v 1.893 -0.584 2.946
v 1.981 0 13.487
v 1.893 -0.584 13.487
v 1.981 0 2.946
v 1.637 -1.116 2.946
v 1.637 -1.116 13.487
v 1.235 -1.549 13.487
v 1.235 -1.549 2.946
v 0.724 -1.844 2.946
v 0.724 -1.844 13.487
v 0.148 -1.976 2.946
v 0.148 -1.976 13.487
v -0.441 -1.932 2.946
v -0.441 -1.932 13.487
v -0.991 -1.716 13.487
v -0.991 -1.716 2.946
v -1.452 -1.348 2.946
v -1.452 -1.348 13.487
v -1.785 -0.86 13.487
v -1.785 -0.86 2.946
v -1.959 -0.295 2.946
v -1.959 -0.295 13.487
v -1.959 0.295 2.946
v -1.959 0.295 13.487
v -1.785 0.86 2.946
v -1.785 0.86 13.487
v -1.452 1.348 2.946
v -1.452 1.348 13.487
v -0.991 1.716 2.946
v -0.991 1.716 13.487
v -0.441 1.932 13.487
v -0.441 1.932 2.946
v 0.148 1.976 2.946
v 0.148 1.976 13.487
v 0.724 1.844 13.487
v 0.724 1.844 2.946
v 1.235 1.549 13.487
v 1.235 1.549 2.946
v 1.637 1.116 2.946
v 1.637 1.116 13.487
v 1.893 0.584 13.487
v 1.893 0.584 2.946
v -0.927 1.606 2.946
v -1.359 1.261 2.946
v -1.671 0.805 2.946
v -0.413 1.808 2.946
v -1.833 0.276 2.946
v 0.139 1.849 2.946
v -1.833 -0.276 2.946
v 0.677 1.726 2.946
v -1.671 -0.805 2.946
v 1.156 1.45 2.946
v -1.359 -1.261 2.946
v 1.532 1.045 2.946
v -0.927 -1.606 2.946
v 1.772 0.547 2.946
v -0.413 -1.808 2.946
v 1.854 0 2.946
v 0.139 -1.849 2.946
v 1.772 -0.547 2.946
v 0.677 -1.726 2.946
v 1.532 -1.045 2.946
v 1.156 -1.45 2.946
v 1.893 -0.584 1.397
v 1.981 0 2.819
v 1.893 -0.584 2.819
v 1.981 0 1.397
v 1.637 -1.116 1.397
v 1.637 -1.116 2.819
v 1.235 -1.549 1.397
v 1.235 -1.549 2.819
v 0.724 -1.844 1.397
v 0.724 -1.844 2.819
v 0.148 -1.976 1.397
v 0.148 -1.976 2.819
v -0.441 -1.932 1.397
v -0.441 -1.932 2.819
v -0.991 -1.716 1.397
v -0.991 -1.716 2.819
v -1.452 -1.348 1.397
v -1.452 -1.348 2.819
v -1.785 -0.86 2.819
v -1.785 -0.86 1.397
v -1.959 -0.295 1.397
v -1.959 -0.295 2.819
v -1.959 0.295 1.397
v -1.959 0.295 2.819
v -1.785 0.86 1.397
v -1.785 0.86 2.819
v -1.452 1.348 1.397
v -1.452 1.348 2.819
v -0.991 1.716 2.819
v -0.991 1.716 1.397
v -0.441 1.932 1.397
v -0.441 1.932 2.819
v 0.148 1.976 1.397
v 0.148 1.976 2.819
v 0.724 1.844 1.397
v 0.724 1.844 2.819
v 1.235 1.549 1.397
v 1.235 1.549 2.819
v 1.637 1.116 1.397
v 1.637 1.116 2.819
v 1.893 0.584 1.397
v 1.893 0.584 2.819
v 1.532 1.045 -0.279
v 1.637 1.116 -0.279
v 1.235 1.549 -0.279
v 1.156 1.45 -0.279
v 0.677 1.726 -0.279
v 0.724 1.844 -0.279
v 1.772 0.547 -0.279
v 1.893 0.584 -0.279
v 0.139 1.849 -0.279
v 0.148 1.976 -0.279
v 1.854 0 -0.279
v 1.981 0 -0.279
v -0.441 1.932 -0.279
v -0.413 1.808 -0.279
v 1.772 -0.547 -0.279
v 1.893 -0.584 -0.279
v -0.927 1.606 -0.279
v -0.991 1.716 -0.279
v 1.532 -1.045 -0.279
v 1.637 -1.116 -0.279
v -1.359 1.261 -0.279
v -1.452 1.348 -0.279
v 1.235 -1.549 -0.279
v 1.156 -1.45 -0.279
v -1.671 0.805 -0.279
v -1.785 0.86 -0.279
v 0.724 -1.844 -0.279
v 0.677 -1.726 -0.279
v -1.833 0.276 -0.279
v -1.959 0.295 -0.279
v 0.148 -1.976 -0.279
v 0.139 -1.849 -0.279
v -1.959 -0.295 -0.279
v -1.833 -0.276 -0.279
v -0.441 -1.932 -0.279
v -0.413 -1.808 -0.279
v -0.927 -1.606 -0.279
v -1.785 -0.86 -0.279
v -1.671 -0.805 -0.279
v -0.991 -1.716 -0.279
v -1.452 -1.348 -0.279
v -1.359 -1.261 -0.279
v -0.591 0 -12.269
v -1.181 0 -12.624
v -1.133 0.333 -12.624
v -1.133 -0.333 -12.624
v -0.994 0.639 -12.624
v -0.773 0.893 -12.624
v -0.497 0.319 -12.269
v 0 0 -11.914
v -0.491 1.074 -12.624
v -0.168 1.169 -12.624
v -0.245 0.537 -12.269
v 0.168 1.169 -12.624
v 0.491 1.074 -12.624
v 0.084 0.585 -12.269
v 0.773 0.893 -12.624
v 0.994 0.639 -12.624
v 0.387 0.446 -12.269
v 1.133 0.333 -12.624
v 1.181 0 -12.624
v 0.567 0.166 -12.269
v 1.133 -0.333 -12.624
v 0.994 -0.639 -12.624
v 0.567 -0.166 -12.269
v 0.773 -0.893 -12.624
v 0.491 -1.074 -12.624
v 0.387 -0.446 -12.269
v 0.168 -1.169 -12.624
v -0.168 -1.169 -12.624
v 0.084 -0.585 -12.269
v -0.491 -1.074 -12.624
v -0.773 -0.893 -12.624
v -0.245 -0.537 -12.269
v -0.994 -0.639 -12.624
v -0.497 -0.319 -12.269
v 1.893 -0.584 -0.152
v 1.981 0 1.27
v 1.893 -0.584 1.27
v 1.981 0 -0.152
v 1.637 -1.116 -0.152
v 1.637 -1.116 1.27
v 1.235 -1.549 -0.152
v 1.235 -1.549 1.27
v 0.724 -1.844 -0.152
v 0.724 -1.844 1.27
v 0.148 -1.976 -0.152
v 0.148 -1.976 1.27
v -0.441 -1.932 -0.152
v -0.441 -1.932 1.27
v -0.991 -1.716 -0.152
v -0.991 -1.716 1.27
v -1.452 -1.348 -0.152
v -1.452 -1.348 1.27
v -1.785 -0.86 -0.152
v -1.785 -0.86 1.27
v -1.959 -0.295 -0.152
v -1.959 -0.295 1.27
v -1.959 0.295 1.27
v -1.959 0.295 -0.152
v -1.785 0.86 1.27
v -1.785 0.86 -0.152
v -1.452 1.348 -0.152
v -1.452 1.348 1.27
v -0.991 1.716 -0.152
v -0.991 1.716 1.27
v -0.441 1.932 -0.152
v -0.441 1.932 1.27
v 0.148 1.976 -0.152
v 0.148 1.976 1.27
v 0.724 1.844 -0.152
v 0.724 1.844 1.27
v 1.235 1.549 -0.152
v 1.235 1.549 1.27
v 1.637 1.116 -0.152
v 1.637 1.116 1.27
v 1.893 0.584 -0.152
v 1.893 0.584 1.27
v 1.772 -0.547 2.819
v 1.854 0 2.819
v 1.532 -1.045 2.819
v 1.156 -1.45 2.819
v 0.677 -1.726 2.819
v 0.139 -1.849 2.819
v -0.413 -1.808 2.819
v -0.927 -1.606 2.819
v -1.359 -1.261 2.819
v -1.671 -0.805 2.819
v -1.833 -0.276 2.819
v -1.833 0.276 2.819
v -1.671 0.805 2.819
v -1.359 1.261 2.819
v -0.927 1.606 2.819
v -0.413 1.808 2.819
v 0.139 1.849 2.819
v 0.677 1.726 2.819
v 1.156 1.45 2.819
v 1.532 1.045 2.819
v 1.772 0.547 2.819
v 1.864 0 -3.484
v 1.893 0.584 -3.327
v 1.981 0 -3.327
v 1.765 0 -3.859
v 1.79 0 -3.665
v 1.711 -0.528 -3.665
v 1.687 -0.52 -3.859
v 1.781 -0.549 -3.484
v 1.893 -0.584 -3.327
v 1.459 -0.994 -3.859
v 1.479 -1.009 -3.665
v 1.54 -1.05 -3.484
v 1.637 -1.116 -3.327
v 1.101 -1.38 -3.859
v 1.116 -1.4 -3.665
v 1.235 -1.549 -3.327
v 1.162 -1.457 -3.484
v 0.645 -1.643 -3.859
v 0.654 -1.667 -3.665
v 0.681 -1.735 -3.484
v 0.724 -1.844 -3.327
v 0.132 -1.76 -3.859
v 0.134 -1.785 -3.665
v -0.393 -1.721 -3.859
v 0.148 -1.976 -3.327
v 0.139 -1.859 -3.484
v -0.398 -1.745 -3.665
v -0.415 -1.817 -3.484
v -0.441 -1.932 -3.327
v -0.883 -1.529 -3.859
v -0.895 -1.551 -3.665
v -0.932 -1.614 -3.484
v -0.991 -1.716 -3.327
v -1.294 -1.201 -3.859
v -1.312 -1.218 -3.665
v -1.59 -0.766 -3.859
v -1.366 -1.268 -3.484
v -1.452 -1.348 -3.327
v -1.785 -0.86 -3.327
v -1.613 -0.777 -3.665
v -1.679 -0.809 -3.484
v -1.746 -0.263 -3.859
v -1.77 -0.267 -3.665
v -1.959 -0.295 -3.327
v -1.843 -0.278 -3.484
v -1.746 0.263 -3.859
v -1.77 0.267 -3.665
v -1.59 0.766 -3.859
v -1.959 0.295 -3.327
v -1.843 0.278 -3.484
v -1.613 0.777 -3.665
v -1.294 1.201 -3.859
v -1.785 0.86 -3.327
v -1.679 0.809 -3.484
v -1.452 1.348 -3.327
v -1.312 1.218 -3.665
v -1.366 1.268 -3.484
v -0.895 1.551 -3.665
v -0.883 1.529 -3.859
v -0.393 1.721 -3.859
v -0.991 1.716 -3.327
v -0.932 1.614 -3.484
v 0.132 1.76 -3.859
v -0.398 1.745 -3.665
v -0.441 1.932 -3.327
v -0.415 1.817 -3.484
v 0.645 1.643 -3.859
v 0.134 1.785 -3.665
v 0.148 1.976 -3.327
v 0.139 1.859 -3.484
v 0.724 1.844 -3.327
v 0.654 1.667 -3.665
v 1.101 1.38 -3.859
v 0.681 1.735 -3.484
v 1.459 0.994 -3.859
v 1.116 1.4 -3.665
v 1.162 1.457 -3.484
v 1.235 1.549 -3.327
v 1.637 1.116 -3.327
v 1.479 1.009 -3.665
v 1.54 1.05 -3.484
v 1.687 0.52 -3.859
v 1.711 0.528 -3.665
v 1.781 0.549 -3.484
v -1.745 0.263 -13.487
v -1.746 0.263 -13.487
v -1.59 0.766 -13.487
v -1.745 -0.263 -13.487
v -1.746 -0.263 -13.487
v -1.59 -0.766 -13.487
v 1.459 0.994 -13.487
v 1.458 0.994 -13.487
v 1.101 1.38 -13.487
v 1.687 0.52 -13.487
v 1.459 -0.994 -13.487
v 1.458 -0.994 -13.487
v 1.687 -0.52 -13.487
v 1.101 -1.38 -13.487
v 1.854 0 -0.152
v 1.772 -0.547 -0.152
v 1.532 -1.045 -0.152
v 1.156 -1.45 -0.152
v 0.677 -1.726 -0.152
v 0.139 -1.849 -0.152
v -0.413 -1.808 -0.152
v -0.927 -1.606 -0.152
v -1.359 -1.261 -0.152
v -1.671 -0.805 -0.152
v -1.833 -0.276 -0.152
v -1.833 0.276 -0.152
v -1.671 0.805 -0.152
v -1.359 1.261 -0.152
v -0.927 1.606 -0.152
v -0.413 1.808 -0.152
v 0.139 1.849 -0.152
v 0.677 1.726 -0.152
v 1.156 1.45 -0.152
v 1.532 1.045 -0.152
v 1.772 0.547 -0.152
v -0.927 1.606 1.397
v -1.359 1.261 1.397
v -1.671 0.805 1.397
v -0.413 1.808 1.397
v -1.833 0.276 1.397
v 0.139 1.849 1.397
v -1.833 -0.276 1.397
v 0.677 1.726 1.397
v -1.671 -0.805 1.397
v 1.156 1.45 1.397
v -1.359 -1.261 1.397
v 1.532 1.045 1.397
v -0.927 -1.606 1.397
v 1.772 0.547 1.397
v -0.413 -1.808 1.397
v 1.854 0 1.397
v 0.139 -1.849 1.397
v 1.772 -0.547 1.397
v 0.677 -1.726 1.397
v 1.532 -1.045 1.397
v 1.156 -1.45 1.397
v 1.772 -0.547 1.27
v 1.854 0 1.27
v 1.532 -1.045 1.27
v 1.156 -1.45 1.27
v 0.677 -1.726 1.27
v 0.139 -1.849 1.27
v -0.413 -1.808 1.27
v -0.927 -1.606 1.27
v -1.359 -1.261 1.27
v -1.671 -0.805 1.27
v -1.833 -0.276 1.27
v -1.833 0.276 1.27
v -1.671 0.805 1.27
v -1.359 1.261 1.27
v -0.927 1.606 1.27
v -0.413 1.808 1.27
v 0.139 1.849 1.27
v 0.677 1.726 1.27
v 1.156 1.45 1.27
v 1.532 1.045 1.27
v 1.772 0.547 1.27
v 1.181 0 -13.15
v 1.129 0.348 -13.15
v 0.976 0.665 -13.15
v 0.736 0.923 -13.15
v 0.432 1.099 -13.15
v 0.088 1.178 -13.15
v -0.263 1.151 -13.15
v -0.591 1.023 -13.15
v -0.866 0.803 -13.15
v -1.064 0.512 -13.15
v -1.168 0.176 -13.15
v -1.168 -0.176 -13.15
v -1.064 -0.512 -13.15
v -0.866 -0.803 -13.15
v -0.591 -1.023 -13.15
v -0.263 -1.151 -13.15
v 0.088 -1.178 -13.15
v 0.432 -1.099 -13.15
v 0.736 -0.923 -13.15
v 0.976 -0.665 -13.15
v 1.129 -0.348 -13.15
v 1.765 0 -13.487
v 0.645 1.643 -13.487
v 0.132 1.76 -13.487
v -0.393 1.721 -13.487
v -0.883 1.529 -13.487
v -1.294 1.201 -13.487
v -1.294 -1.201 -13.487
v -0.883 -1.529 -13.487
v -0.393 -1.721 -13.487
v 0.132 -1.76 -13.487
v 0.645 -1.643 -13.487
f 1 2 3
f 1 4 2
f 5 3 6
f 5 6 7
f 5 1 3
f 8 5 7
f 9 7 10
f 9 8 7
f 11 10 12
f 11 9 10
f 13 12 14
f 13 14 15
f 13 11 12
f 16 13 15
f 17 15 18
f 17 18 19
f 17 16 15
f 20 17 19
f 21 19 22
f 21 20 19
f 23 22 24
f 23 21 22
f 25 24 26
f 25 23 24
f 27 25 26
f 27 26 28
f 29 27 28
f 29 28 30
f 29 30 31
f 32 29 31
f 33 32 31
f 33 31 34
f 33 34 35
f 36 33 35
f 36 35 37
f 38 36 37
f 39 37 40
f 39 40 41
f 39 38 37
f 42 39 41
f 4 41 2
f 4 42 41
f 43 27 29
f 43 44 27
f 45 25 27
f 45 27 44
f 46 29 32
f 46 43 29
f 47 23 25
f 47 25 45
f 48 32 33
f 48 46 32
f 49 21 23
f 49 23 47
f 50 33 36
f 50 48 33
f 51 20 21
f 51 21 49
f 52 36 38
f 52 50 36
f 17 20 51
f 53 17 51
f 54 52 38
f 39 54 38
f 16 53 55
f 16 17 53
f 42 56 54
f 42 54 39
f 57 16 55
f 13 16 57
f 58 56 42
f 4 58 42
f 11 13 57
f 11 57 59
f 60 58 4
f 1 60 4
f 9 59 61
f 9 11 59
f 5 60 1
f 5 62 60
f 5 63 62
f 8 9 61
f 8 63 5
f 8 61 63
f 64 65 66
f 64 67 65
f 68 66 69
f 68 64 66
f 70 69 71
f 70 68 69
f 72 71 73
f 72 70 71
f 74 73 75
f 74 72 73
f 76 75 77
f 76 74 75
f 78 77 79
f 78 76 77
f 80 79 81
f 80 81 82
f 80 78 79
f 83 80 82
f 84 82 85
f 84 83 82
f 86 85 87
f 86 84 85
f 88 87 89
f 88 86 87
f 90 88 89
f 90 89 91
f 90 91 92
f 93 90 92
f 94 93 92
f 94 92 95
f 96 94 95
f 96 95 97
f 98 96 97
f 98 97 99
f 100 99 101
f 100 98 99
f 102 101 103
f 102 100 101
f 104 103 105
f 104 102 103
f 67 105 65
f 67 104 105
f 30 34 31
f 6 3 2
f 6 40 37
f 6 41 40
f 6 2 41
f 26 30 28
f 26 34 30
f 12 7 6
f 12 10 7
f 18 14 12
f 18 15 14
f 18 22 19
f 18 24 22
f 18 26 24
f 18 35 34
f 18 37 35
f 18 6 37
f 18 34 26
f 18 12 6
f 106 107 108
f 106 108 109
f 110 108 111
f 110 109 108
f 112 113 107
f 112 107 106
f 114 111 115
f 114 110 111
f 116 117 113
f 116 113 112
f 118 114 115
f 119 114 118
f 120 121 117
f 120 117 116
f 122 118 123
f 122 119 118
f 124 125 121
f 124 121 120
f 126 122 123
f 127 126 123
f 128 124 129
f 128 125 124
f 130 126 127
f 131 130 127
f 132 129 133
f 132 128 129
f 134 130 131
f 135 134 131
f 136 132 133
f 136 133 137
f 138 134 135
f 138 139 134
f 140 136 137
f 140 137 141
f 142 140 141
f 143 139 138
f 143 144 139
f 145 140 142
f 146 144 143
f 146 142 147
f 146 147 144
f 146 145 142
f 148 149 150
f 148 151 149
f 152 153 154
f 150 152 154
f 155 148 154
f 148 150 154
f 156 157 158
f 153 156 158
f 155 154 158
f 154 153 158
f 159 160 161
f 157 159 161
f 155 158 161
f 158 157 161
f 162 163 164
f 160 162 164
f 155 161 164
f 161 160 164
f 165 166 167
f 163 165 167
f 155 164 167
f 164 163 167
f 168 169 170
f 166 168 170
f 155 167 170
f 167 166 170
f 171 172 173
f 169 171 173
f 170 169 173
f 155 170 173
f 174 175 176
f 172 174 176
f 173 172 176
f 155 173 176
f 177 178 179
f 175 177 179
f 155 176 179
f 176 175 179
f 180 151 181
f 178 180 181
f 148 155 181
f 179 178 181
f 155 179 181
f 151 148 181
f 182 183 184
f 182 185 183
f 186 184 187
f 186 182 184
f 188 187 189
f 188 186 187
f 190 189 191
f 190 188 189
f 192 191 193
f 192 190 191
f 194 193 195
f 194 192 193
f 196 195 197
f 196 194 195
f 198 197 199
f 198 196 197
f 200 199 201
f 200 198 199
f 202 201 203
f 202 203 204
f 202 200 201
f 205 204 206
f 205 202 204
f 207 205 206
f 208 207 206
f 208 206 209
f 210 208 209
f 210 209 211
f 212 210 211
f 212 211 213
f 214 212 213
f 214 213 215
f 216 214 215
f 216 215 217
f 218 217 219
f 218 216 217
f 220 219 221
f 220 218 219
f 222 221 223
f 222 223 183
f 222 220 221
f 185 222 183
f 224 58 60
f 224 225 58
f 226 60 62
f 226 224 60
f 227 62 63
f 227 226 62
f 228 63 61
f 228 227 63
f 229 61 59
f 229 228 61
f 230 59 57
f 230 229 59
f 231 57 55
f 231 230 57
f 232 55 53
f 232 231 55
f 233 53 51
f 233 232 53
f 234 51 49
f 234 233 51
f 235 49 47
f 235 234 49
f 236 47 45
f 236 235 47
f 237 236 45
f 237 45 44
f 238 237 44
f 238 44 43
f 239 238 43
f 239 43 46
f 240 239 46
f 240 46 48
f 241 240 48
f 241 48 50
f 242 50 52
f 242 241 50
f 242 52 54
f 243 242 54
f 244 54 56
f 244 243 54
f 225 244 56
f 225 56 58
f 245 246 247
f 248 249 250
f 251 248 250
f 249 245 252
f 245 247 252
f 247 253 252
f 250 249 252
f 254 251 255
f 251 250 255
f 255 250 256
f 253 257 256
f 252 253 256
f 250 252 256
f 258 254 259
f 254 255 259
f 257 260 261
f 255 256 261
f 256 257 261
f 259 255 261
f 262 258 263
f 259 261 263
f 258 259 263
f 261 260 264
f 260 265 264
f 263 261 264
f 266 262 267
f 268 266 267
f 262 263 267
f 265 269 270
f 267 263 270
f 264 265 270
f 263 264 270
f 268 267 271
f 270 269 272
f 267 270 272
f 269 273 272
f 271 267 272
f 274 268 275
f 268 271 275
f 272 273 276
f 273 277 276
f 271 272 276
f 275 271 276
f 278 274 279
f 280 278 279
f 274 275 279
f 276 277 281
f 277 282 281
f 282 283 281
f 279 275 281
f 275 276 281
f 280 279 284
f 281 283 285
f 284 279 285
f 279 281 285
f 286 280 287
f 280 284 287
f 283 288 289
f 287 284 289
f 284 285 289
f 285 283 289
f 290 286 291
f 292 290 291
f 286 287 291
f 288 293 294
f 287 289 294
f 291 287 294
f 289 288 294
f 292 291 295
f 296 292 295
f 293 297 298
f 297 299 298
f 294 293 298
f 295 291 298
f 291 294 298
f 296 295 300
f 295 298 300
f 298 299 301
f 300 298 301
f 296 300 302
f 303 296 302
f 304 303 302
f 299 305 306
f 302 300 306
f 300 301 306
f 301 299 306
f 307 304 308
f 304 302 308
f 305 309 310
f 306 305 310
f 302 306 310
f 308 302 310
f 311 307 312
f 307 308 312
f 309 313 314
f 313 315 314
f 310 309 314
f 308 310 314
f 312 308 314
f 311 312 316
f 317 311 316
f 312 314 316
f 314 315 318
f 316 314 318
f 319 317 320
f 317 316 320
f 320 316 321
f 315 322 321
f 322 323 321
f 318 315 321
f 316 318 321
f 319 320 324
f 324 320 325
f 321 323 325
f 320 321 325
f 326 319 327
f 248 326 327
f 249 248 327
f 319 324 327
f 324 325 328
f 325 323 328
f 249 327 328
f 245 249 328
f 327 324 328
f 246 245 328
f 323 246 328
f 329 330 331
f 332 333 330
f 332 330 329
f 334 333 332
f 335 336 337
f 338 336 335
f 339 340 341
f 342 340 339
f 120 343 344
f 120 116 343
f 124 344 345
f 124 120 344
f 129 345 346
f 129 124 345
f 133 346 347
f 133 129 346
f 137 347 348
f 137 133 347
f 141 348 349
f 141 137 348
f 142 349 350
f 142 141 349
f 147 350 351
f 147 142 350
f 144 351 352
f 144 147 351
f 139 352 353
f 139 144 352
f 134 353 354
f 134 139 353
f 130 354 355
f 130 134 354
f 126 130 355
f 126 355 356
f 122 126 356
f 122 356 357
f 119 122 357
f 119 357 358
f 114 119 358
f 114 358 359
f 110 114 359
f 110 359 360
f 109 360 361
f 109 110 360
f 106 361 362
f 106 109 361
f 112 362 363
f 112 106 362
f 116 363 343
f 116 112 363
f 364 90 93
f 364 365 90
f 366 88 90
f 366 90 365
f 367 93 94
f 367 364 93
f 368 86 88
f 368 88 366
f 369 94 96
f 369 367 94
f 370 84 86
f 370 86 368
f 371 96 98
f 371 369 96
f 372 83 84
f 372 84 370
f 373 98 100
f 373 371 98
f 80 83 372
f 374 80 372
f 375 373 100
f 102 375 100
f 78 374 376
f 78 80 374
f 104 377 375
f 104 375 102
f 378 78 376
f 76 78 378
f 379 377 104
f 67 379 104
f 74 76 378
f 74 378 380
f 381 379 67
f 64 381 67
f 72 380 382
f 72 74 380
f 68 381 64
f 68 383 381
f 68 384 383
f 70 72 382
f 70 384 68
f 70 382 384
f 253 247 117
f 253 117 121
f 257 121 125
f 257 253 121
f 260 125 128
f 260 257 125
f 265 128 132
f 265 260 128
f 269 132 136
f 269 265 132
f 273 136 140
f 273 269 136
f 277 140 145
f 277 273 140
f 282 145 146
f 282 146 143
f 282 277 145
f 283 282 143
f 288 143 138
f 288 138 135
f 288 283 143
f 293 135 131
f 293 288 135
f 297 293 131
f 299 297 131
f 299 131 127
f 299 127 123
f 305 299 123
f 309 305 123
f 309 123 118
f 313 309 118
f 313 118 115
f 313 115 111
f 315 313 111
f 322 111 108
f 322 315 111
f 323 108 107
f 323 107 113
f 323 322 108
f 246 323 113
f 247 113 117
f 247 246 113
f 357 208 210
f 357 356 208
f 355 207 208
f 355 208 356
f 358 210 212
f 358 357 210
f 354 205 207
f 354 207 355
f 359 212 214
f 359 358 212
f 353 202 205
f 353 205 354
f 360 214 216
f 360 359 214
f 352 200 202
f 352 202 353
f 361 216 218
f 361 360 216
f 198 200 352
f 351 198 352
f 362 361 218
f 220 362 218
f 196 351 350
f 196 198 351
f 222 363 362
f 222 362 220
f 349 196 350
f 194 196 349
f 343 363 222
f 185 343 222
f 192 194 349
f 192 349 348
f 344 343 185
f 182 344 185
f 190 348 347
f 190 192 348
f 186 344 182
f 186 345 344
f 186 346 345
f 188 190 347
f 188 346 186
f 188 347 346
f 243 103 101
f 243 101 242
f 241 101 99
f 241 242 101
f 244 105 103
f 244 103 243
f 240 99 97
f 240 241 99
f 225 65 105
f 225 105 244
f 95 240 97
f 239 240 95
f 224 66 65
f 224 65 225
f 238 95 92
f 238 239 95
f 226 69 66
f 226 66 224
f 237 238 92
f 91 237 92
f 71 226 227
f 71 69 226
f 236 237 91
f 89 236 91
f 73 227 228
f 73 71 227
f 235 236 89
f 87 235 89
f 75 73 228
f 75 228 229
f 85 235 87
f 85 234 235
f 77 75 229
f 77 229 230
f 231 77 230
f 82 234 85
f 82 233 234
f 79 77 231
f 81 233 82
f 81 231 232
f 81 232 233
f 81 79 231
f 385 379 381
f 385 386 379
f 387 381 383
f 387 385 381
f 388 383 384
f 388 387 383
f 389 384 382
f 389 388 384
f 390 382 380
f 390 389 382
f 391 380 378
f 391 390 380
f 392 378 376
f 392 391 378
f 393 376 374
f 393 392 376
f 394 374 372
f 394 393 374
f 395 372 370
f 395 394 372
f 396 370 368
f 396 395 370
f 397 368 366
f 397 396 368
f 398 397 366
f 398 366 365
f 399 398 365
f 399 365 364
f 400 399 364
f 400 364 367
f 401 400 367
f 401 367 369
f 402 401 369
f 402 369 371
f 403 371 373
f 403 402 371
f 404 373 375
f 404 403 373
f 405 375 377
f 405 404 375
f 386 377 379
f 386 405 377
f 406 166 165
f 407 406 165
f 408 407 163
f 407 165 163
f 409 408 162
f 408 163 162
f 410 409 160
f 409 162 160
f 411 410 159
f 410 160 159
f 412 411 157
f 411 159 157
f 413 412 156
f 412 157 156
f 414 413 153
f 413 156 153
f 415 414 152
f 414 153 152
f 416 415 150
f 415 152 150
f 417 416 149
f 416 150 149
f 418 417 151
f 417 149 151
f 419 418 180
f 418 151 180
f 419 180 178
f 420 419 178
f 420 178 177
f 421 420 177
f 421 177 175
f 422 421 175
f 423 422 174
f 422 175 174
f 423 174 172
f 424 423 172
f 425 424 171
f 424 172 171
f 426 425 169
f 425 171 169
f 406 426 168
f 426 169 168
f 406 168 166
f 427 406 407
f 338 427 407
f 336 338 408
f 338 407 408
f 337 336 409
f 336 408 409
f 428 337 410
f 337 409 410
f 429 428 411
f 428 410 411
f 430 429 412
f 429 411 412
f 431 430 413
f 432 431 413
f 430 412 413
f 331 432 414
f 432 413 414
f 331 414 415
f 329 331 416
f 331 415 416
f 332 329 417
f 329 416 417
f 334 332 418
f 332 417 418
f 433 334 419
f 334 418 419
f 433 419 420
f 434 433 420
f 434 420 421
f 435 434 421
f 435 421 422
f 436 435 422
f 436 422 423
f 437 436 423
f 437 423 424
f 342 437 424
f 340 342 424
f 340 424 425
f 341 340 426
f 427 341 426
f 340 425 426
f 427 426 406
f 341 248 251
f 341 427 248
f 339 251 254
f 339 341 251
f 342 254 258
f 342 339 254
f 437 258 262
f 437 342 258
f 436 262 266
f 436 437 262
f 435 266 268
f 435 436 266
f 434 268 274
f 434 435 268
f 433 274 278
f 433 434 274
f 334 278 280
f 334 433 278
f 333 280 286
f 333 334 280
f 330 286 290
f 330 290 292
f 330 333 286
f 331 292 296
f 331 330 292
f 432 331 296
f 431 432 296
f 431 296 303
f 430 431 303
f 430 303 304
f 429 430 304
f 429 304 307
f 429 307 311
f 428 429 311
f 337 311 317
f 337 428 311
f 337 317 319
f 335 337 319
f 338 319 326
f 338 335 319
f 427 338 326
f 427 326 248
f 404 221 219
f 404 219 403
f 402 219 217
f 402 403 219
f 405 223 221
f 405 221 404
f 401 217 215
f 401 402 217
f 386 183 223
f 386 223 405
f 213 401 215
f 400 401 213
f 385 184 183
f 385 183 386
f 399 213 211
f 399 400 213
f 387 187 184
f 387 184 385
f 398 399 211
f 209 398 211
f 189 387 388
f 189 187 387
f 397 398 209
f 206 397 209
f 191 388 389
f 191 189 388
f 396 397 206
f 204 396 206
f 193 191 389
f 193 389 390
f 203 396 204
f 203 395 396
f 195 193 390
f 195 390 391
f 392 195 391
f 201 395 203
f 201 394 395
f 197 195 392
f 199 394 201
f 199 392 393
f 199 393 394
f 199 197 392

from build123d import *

# Parameters (mm, degrees)
REDONDEO1_R                      = 0.762
TALADRO_DE_MARGEN_PARA_101_D     = 2.3622
TALADRO_DE_MARGEN_PARA_101_DEPTH = 0.8636
TALADRO_DE_MARGEN_PARA_101_TIP   = 0.709676477
CHAFL_N1_SIZE2                   = 0.337288027
CHAFL_N1_SIZE                    = 0.5842


# Some blends are built 0.0001 mm under size
with BuildPart() as part:
    # Croquis1 → Revolución1 (revolve)
    with BuildSketch(Plane(origin=(0, 0, 0), x_dir=(0, 0, -1), z_dir=(1, 0, 0)), mode=Mode.PRIVATE) as revoluci_n1_sk:
        Polygon((-13.4874, 0), (-13.4874, 1.9812), (-2.9464, 1.9812), (-2.9464, 1.8542), (-2.8194, 1.8542), (-2.8194, 1.9812), (-1.397, 1.9812), (-1.397, 1.8542), (-1.27, 1.8542), (-1.27, 1.9812), (0.1524, 1.9812), (0.1524, 1.8542), (0.2794, 1.8542), (0.2794, 1.9812), (3.3274, 1.9812), (3.3274, 1.7653), (13.4874, 1.7653), (13.4874, 0), align=None)
    revolve(revoluci_n1_sk.sketch.rotate(Axis((0, 0, 127), (0, 0, -1)), 90), axis=Axis((0, 0, 127), (0, 0, -1)))

    # Redondeo1
    # the kernel refuses this fillet: 0.762 mm, written as the material it adds along each edge
    with BuildSketch(Plane(origin=(0, 0, -3.3274), x_dir=(1, 0, 0), z_dir=(0, 1, 0))) as redondeo1_piece_1:
        with BuildLine():
            CenterArc((2.5273, 0.531430889), REDONDEO1_R, 180, 44.220044428)
            Line((1.7653, 0.531430889), (1.75006, 0.531430889))
            Line((1.75006, 0.531430889), (1.75006, 0))
            Line((1.75006, 0), (1.7653, -0.01524))
            ThreePointArc((1.7653, -0.01524), (1.87325, -0.01524), (1.970278, -0.010628618))
            Line((1.970278, -0.010628618), (1.9812, 0))
        make_face()
    revolve(axis=Axis((0, 0, -3.3274), (0, 0, -1)))

    # Taladro de margen para #101
    with Locations(Plane(origin=(0, 0, -13.4874), x_dir=(-1, 0, 0), z_dir=(0, 0, -1))):
        with Locations((0, 0)):
            Hole(TALADRO_DE_MARGEN_PARA_101_D / 2, depth=TALADRO_DE_MARGEN_PARA_101_DEPTH)
            with Locations((0, 0, -(TALADRO_DE_MARGEN_PARA_101_DEPTH + TALADRO_DE_MARGEN_PARA_101_TIP / 2))):  # 118° drill point
                Cone(0, TALADRO_DE_MARGEN_PARA_101_D / 2, TALADRO_DE_MARGEN_PARA_101_TIP, mode=Mode.SUBTRACT)

    # Chaflán1
    chafl_n1_edges = [part.edges().sort_by_distance(p)[0] for p in [
        (-1.1811, 0, -13.4874),
    ]]
    chafl_n1_side = [part.faces().sort_by_distance(p)[0] for p in [
        (-1.187845761, 0, -13.4874),
    ]]
    chamfer(chafl_n1_edges, length=CHAFL_N1_SIZE - 0.0001, length2=CHAFL_N1_SIZE2 - 0.0001, reference=chafl_n1_side[0])  # a hair under: the kernel refuses the full size


solid = part.part
